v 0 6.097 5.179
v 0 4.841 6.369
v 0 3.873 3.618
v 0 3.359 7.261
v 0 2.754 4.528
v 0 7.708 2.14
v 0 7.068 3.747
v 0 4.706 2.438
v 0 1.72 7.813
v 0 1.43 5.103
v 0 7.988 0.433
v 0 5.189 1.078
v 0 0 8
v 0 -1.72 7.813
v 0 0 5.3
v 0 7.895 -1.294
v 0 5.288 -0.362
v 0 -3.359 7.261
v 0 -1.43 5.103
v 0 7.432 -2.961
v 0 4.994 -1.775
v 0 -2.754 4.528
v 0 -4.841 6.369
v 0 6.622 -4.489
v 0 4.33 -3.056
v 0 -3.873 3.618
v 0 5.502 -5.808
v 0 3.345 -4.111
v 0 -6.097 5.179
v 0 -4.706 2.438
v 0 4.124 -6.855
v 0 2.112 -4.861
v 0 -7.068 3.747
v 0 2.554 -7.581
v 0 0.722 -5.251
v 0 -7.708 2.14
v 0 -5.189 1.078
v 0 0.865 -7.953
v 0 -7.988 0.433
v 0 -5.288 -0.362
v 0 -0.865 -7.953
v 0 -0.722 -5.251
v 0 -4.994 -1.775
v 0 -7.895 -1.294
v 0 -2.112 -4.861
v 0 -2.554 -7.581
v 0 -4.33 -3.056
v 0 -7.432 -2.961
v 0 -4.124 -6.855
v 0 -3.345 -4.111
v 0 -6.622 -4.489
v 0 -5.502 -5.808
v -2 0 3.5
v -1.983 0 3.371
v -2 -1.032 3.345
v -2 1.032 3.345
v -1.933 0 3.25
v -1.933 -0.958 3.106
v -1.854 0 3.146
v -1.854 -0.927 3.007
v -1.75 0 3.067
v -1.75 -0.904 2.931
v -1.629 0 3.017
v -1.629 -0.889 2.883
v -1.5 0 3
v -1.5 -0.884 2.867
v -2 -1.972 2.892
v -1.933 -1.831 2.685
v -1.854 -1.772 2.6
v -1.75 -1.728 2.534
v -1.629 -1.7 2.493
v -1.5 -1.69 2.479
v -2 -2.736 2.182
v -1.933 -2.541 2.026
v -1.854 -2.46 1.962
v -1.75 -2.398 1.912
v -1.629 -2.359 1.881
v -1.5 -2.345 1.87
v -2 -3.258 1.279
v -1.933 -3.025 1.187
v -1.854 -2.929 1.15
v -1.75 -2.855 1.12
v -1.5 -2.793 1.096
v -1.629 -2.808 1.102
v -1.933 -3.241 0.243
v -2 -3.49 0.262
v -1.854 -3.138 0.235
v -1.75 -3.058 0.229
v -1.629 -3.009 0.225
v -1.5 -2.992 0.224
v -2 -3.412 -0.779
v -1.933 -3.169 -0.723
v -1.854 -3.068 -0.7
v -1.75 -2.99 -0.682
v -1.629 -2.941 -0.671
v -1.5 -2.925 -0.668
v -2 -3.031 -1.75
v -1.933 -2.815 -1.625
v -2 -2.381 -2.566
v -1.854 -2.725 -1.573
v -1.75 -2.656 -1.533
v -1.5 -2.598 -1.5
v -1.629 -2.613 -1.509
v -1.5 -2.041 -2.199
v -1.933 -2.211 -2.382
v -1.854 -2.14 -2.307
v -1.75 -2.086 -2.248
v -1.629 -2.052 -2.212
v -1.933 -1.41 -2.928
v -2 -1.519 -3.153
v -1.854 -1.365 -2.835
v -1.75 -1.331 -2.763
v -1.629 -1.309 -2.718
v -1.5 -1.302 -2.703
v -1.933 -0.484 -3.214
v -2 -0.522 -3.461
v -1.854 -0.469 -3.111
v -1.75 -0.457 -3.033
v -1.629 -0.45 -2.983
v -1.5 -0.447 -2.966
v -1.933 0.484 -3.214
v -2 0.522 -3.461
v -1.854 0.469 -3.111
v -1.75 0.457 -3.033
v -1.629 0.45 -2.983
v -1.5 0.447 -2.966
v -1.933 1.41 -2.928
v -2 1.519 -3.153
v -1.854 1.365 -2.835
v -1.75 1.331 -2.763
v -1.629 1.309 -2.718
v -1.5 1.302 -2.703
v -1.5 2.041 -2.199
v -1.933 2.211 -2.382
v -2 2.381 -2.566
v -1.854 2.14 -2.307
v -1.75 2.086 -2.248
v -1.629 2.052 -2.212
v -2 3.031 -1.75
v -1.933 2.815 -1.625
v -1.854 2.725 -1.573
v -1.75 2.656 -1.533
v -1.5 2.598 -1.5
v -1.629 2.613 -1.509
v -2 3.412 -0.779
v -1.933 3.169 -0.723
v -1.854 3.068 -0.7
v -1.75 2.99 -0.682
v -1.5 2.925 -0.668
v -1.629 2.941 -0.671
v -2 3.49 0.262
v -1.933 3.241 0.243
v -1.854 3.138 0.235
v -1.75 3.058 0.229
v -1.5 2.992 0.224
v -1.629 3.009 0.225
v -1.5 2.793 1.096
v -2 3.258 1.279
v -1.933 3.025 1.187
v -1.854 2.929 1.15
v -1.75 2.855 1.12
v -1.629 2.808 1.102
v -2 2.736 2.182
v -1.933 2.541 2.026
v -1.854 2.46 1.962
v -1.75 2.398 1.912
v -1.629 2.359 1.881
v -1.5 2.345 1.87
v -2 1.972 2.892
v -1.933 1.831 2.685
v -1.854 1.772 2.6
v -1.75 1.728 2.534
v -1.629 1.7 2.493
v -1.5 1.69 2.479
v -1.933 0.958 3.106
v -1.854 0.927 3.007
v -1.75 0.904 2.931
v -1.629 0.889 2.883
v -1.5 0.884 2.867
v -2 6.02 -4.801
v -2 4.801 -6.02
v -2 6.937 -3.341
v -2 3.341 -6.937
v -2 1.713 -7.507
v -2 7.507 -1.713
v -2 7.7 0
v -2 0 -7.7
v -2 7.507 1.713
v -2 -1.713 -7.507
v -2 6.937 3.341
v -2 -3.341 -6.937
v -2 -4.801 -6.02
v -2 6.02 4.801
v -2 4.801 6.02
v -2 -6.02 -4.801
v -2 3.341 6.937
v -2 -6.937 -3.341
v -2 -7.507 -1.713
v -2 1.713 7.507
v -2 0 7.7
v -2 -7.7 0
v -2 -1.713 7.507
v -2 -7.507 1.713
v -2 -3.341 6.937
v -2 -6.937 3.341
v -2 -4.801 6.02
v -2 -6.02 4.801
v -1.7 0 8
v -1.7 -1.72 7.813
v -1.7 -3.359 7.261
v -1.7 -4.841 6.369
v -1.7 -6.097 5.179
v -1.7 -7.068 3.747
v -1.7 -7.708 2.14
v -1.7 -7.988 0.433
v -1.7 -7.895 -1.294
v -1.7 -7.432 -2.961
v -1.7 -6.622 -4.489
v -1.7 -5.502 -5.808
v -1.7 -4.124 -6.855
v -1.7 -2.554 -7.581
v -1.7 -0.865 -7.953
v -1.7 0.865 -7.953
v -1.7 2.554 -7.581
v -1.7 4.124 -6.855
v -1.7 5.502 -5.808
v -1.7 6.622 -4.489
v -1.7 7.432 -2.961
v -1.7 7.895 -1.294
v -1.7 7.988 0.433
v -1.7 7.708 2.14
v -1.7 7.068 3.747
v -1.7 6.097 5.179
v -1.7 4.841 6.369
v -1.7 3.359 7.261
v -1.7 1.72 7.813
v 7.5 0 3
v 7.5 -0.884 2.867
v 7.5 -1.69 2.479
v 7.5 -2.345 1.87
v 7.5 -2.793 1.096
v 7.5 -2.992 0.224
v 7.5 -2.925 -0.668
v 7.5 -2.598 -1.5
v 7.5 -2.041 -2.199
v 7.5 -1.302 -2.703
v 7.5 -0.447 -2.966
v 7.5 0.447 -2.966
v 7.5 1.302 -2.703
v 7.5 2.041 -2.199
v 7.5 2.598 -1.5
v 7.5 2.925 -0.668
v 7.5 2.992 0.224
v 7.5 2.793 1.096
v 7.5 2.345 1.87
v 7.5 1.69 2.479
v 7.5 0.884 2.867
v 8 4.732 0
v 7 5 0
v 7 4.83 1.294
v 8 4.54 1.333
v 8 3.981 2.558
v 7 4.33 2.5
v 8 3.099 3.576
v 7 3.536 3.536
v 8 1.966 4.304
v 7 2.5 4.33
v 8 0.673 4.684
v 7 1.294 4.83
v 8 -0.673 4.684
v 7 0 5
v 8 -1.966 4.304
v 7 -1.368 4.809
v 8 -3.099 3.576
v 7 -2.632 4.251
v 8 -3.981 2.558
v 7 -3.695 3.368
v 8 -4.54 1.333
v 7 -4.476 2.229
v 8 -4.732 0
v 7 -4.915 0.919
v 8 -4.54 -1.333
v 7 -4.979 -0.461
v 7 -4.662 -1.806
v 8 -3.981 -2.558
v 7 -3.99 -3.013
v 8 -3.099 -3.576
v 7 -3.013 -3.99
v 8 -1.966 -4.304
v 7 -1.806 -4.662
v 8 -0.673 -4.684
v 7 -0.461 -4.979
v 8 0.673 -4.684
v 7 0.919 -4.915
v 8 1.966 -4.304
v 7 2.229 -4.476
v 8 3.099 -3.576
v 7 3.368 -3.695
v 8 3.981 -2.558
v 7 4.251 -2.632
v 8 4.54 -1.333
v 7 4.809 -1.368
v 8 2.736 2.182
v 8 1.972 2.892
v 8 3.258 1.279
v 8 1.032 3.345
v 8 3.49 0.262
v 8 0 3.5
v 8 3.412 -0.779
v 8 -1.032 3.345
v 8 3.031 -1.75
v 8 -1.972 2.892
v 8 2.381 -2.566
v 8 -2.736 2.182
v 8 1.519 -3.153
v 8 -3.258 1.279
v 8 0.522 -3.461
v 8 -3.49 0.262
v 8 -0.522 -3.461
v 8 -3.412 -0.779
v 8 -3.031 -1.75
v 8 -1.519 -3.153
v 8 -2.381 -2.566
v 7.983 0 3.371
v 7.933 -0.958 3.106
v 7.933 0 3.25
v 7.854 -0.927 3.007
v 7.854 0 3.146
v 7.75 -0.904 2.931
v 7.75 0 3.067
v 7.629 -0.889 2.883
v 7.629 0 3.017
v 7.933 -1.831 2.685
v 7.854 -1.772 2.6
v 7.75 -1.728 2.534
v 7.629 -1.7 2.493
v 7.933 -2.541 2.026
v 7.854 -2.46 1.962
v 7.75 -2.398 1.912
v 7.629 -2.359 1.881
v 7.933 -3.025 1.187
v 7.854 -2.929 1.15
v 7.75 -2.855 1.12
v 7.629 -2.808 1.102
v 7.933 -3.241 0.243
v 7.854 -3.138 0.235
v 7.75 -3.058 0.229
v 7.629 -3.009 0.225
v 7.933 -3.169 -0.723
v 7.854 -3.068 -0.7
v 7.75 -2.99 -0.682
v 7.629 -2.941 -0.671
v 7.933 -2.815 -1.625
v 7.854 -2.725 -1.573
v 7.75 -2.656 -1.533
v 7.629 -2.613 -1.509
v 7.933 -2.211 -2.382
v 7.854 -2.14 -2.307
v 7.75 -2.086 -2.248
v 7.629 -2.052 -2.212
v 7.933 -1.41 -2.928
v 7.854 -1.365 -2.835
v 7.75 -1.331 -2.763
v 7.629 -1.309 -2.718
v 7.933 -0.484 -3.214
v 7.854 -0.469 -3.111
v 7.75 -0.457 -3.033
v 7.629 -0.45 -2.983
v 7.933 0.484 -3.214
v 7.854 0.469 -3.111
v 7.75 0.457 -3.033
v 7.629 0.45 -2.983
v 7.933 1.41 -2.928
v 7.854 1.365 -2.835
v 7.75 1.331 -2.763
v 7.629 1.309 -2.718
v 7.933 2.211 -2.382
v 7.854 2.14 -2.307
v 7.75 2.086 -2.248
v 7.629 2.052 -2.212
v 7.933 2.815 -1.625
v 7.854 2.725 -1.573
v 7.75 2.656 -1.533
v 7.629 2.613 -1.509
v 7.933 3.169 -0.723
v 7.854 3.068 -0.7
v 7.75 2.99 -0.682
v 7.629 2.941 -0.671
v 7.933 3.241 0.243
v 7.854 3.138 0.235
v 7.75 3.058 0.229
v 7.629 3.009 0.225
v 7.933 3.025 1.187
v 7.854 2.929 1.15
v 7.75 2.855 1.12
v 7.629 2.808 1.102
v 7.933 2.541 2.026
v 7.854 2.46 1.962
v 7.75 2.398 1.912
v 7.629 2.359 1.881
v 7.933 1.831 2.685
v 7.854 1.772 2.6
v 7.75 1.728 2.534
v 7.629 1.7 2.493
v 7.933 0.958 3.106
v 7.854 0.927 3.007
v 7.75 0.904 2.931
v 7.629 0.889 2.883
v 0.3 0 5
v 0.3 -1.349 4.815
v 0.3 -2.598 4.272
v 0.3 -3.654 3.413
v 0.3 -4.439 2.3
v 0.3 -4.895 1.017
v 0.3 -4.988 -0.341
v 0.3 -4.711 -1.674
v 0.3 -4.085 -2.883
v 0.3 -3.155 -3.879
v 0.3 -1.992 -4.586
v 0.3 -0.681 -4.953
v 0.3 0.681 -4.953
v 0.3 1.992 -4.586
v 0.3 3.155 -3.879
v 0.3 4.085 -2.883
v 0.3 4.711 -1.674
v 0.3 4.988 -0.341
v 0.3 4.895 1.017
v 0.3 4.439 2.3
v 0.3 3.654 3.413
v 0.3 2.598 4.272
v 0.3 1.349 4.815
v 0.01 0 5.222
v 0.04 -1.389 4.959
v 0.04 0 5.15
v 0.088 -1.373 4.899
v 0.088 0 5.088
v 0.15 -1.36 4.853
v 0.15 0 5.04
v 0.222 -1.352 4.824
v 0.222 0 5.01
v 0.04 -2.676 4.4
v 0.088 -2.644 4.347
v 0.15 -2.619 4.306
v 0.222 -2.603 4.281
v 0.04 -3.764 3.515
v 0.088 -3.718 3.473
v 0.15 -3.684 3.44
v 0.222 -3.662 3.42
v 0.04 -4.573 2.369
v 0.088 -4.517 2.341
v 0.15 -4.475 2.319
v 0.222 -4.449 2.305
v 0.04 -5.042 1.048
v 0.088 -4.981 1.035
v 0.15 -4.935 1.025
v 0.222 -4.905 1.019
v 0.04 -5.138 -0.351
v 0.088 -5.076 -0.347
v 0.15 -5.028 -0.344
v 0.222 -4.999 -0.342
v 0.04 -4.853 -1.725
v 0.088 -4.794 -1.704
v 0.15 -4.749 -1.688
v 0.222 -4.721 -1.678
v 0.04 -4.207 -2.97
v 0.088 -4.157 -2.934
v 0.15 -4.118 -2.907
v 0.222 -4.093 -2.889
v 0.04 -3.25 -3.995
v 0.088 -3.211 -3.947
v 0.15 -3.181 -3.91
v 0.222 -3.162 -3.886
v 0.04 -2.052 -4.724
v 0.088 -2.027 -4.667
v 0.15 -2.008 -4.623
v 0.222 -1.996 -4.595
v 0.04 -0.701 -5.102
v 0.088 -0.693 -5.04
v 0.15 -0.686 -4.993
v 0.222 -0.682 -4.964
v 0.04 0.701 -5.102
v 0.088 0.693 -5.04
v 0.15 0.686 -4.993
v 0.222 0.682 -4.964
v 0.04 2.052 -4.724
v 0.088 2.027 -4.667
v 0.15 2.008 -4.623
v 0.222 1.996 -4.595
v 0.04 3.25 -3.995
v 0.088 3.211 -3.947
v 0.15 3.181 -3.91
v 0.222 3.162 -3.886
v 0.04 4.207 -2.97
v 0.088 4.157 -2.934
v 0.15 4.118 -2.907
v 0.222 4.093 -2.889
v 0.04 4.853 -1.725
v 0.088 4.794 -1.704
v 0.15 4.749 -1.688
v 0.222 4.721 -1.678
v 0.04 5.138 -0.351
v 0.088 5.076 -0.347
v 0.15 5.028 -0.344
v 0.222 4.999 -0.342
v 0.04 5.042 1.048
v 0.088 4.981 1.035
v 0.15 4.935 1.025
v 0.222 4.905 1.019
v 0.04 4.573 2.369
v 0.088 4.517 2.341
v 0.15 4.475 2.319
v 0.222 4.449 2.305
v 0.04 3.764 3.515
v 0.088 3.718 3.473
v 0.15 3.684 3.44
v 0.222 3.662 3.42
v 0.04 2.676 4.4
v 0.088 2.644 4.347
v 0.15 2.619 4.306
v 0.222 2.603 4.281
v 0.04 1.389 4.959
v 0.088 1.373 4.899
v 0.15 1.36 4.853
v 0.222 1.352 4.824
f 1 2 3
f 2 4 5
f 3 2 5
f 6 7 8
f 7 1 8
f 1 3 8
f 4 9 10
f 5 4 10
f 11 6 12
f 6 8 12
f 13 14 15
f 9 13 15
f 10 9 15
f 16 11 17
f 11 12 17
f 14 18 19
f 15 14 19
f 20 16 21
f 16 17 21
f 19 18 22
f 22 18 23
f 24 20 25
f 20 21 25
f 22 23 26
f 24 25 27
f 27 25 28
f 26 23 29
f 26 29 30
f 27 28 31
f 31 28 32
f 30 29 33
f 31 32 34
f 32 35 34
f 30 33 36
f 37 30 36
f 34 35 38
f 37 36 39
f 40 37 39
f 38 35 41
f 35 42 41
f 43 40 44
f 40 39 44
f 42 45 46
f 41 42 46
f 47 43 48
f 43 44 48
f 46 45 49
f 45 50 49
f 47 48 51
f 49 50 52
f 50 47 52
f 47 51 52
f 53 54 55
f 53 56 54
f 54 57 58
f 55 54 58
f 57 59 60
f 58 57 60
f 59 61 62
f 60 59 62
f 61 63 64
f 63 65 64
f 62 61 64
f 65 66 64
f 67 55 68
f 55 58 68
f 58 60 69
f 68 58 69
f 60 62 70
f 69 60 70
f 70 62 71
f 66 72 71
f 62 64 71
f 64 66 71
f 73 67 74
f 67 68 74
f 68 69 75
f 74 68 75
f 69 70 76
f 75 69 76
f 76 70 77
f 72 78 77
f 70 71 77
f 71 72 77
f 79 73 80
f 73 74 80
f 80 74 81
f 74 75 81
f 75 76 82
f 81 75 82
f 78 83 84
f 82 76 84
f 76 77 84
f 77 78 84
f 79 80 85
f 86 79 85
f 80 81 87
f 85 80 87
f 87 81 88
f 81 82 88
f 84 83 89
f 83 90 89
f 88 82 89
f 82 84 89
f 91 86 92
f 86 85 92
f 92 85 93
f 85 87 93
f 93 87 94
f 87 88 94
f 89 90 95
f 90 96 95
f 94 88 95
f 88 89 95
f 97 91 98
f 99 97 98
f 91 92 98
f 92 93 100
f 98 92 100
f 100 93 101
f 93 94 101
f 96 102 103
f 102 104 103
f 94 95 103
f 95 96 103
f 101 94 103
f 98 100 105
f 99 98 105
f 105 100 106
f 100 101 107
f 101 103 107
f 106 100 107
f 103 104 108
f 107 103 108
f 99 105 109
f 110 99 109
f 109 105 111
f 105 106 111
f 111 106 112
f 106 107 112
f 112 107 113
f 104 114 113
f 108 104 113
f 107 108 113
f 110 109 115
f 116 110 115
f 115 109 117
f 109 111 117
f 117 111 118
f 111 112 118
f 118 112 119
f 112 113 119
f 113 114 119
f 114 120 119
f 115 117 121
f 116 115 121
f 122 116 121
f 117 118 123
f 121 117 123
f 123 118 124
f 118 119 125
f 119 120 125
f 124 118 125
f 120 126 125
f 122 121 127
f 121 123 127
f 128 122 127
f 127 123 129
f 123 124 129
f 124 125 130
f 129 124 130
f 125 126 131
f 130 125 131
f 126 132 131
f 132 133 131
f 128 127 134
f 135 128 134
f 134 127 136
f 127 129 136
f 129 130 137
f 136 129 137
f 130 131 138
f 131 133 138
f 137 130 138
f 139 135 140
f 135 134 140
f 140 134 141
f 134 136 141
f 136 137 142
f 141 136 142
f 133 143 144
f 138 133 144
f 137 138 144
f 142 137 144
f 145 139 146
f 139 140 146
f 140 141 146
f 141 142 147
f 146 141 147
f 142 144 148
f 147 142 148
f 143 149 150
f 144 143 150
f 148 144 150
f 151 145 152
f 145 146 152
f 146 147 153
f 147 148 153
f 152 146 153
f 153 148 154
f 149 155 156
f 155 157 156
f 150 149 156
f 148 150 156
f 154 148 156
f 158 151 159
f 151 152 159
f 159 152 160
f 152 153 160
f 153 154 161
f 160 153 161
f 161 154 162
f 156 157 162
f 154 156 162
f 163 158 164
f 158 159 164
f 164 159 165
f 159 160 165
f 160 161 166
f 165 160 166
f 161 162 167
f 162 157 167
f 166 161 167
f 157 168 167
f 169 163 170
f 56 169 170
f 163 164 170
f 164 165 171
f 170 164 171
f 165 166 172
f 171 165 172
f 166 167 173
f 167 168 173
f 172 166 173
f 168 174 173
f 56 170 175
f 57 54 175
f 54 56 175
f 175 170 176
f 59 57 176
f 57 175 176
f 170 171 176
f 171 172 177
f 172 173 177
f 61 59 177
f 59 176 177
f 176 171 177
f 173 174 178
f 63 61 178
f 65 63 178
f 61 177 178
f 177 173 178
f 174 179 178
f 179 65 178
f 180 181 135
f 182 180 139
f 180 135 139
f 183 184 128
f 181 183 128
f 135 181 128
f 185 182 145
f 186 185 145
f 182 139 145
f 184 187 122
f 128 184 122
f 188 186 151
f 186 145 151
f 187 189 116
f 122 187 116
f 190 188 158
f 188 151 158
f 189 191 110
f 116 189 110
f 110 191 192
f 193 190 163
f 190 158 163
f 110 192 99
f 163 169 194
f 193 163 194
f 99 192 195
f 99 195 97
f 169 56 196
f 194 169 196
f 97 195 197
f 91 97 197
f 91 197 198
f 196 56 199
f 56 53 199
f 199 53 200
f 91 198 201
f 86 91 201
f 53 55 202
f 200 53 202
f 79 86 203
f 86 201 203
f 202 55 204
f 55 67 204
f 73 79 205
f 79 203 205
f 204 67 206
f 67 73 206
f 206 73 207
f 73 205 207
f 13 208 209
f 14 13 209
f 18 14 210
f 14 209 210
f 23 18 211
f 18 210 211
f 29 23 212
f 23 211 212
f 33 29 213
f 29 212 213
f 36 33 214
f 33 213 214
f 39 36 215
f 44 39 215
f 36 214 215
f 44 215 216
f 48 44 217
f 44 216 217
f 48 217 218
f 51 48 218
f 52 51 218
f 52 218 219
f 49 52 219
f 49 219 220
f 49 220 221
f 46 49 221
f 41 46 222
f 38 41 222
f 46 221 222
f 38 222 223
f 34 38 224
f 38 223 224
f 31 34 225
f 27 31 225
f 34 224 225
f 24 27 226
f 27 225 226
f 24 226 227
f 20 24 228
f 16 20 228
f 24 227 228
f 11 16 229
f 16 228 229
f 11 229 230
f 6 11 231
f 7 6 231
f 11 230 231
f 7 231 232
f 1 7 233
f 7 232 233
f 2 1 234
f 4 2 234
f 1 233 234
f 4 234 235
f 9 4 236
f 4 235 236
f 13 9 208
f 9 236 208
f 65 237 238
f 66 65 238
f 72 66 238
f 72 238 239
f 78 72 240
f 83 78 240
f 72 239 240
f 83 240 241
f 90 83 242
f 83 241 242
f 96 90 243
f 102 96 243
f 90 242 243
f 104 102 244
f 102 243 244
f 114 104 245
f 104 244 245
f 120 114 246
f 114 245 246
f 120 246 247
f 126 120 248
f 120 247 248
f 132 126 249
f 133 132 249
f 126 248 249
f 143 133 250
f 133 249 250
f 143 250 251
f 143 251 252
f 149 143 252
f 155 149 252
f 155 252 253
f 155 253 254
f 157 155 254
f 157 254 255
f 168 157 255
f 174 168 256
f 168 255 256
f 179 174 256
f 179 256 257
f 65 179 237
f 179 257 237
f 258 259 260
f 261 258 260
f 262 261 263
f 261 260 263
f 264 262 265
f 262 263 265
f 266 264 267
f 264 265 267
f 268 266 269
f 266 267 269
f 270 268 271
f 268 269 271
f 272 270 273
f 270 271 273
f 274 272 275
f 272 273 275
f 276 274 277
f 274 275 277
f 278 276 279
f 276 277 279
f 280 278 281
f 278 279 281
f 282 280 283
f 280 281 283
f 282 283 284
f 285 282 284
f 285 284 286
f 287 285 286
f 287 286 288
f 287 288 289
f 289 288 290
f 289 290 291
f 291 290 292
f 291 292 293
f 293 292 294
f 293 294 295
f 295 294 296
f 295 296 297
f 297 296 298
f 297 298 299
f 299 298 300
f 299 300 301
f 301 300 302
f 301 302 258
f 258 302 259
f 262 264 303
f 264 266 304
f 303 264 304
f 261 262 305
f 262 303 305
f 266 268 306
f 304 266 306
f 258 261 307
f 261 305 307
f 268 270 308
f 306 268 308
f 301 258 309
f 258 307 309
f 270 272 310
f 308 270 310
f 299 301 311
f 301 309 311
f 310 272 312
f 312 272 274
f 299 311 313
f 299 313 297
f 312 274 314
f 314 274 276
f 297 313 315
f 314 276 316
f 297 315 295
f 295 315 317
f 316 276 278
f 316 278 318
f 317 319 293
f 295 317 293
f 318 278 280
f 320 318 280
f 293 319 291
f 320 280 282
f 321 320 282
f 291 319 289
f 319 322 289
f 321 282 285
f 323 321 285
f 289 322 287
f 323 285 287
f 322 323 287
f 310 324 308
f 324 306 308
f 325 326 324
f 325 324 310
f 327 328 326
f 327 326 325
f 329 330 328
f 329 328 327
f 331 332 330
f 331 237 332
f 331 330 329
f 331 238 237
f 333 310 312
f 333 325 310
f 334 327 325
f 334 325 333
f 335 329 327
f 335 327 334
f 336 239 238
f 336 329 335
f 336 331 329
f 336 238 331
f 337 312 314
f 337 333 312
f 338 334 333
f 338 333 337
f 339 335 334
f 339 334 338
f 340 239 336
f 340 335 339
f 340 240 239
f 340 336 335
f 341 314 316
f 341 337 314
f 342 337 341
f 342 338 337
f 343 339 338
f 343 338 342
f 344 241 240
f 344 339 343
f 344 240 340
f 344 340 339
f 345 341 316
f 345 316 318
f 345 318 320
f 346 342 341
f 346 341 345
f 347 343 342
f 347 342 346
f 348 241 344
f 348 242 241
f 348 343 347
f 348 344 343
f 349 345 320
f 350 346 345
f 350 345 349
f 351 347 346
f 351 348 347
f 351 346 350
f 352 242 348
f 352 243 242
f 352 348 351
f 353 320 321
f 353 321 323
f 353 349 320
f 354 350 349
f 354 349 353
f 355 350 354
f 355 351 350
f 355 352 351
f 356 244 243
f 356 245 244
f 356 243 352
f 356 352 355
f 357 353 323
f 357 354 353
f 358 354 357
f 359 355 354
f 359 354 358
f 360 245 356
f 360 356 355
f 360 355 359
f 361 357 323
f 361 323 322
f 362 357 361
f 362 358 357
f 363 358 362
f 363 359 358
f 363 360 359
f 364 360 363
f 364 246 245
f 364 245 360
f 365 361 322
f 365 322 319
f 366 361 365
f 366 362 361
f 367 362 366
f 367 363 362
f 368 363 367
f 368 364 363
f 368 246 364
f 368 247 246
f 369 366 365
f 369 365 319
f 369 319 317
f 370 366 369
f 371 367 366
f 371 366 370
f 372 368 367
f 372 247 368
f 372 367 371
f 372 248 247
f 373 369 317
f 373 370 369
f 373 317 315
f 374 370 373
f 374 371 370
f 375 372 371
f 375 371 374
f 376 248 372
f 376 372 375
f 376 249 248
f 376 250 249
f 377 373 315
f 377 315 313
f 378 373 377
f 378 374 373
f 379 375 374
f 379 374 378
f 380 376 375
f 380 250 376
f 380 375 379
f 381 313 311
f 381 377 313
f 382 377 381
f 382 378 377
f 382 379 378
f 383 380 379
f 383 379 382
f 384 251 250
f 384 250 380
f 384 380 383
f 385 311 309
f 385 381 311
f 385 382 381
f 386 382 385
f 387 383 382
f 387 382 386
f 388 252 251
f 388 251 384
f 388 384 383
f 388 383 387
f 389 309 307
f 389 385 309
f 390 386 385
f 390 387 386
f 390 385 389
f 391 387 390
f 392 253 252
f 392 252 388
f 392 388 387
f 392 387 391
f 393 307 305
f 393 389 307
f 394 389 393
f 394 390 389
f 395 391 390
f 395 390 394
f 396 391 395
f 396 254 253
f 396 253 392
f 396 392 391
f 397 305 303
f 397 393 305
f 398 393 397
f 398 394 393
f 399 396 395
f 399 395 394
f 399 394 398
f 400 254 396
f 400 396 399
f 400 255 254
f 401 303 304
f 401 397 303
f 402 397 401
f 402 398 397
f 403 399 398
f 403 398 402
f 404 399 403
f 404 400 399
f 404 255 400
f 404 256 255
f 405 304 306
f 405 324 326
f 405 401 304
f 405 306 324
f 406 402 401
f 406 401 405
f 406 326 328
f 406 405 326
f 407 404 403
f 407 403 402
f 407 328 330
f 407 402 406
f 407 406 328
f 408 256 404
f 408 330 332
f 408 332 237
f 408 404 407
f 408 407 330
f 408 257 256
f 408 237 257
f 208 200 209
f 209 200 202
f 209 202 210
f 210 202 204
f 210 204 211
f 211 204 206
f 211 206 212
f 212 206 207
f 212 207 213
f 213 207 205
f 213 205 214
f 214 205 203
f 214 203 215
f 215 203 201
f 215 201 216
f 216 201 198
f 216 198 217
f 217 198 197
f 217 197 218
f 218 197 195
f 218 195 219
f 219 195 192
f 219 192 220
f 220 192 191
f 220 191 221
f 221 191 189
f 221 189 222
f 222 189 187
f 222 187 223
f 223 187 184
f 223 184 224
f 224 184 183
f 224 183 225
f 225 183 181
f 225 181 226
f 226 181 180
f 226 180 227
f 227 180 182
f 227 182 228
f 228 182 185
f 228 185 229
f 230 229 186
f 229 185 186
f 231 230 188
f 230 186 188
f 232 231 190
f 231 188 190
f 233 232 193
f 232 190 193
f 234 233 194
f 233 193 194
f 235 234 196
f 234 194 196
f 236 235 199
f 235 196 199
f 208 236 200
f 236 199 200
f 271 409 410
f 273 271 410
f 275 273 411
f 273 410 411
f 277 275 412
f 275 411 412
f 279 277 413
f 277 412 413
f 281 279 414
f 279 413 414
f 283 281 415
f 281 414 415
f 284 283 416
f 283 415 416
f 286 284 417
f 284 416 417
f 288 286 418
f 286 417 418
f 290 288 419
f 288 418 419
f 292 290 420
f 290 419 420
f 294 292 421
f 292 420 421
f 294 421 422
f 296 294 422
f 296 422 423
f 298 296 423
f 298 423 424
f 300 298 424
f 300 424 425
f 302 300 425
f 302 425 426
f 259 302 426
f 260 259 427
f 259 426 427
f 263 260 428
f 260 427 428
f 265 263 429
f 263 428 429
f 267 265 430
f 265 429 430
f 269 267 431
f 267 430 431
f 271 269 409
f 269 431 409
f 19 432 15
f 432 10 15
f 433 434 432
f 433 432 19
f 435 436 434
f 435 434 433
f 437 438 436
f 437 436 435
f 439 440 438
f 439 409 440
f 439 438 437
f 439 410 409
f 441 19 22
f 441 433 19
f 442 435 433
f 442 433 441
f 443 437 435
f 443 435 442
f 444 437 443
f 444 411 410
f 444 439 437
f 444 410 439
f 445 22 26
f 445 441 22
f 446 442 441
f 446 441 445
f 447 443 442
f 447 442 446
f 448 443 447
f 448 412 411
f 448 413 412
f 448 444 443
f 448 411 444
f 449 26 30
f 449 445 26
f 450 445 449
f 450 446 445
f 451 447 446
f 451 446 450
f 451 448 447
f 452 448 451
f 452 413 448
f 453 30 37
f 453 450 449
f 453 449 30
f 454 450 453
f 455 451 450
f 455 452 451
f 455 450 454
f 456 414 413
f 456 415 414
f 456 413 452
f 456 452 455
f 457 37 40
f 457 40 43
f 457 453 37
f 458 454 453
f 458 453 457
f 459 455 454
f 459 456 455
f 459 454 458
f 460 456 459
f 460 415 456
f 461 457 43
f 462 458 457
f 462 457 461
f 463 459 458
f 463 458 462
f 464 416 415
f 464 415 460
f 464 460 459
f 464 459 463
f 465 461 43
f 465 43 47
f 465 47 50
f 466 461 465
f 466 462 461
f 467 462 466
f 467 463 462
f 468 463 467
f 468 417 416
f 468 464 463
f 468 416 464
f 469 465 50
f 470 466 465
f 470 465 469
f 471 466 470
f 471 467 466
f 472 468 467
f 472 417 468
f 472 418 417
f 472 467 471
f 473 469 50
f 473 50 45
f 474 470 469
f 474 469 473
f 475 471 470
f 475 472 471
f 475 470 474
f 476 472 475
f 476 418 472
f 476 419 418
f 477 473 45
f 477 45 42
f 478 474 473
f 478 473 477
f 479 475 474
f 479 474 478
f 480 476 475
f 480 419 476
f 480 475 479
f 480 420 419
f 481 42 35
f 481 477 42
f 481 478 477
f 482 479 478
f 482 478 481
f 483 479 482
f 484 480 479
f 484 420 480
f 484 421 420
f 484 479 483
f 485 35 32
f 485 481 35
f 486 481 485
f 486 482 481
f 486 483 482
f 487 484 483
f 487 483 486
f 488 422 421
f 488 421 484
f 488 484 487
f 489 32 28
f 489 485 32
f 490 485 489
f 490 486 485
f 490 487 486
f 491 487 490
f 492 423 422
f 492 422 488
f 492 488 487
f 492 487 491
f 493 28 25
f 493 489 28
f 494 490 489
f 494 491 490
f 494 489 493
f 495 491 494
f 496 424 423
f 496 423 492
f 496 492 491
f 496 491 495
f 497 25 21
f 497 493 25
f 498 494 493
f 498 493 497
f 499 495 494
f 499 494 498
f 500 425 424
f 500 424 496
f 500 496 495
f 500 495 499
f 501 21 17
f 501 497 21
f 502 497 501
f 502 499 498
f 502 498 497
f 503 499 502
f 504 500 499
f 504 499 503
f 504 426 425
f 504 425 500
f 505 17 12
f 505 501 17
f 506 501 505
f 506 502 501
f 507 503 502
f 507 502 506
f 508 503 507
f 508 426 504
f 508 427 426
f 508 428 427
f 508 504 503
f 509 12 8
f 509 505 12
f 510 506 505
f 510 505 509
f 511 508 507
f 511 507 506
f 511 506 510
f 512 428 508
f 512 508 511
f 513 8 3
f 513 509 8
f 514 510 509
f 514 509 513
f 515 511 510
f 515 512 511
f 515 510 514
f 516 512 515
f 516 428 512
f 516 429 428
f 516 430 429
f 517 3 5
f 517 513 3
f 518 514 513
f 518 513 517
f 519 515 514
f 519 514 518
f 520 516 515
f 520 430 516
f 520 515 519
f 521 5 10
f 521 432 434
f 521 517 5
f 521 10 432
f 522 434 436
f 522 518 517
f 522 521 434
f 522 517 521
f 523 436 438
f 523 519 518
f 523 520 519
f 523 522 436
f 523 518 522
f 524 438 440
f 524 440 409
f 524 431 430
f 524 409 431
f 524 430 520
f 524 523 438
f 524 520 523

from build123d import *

# Parameters (mm, degrees)
CHAMFER1_SIZE  = 0.3
FILLET1_R      = 0.3
CHAMFER3_SIZE  = 1
CHAMFER3_SIZE2 = 0.267949192
FILLET5_R      = 0.5


with BuildPart() as part:
    # Sketch1 → Revolve1 (revolve)
    with BuildSketch(Plane.XY):
        Polygon((-2, 3), (8, 3), (8, 5), (0, 5), (0, 8), (-2, 8), align=None)
    revolve(axis=Axis((-2, 0, 0), (1, 0, 0)))

    # Chamfer1
    chamfer1_edges = [part.edges().sort_by_distance(p)[0] for p in [
        (-2, -8, 0),
    ]]
    chamfer(chamfer1_edges, length=CHAMFER1_SIZE)

    # Fillet1
    fillet1_edges = [part.edges().sort_by_distance(p)[0] for p in [
        (0, -5, 0),
    ]]
    fillet(fillet1_edges, radius=FILLET1_R)

    # Chamfer3
    chamfer3_edges = [part.edges().sort_by_distance(p)[0] for p in [
        (8, -5, 0),
    ]]
    chamfer3_side = [part.faces().sort_by_distance(p)[0] for p in [
        (4.15, -5, 0),
    ]]
    chamfer(chamfer3_edges, length=CHAMFER3_SIZE, length2=CHAMFER3_SIZE2, reference=chamfer3_side[0])

    # Fillet5
    fillet5_edges = [part.edges().sort_by_distance(p)[0] for p in [
        (8, -3, 0),
        (-2, -3, 0),
    ]]
    fillet(fillet5_edges, radius=FILLET5_R)


solid = part.part
